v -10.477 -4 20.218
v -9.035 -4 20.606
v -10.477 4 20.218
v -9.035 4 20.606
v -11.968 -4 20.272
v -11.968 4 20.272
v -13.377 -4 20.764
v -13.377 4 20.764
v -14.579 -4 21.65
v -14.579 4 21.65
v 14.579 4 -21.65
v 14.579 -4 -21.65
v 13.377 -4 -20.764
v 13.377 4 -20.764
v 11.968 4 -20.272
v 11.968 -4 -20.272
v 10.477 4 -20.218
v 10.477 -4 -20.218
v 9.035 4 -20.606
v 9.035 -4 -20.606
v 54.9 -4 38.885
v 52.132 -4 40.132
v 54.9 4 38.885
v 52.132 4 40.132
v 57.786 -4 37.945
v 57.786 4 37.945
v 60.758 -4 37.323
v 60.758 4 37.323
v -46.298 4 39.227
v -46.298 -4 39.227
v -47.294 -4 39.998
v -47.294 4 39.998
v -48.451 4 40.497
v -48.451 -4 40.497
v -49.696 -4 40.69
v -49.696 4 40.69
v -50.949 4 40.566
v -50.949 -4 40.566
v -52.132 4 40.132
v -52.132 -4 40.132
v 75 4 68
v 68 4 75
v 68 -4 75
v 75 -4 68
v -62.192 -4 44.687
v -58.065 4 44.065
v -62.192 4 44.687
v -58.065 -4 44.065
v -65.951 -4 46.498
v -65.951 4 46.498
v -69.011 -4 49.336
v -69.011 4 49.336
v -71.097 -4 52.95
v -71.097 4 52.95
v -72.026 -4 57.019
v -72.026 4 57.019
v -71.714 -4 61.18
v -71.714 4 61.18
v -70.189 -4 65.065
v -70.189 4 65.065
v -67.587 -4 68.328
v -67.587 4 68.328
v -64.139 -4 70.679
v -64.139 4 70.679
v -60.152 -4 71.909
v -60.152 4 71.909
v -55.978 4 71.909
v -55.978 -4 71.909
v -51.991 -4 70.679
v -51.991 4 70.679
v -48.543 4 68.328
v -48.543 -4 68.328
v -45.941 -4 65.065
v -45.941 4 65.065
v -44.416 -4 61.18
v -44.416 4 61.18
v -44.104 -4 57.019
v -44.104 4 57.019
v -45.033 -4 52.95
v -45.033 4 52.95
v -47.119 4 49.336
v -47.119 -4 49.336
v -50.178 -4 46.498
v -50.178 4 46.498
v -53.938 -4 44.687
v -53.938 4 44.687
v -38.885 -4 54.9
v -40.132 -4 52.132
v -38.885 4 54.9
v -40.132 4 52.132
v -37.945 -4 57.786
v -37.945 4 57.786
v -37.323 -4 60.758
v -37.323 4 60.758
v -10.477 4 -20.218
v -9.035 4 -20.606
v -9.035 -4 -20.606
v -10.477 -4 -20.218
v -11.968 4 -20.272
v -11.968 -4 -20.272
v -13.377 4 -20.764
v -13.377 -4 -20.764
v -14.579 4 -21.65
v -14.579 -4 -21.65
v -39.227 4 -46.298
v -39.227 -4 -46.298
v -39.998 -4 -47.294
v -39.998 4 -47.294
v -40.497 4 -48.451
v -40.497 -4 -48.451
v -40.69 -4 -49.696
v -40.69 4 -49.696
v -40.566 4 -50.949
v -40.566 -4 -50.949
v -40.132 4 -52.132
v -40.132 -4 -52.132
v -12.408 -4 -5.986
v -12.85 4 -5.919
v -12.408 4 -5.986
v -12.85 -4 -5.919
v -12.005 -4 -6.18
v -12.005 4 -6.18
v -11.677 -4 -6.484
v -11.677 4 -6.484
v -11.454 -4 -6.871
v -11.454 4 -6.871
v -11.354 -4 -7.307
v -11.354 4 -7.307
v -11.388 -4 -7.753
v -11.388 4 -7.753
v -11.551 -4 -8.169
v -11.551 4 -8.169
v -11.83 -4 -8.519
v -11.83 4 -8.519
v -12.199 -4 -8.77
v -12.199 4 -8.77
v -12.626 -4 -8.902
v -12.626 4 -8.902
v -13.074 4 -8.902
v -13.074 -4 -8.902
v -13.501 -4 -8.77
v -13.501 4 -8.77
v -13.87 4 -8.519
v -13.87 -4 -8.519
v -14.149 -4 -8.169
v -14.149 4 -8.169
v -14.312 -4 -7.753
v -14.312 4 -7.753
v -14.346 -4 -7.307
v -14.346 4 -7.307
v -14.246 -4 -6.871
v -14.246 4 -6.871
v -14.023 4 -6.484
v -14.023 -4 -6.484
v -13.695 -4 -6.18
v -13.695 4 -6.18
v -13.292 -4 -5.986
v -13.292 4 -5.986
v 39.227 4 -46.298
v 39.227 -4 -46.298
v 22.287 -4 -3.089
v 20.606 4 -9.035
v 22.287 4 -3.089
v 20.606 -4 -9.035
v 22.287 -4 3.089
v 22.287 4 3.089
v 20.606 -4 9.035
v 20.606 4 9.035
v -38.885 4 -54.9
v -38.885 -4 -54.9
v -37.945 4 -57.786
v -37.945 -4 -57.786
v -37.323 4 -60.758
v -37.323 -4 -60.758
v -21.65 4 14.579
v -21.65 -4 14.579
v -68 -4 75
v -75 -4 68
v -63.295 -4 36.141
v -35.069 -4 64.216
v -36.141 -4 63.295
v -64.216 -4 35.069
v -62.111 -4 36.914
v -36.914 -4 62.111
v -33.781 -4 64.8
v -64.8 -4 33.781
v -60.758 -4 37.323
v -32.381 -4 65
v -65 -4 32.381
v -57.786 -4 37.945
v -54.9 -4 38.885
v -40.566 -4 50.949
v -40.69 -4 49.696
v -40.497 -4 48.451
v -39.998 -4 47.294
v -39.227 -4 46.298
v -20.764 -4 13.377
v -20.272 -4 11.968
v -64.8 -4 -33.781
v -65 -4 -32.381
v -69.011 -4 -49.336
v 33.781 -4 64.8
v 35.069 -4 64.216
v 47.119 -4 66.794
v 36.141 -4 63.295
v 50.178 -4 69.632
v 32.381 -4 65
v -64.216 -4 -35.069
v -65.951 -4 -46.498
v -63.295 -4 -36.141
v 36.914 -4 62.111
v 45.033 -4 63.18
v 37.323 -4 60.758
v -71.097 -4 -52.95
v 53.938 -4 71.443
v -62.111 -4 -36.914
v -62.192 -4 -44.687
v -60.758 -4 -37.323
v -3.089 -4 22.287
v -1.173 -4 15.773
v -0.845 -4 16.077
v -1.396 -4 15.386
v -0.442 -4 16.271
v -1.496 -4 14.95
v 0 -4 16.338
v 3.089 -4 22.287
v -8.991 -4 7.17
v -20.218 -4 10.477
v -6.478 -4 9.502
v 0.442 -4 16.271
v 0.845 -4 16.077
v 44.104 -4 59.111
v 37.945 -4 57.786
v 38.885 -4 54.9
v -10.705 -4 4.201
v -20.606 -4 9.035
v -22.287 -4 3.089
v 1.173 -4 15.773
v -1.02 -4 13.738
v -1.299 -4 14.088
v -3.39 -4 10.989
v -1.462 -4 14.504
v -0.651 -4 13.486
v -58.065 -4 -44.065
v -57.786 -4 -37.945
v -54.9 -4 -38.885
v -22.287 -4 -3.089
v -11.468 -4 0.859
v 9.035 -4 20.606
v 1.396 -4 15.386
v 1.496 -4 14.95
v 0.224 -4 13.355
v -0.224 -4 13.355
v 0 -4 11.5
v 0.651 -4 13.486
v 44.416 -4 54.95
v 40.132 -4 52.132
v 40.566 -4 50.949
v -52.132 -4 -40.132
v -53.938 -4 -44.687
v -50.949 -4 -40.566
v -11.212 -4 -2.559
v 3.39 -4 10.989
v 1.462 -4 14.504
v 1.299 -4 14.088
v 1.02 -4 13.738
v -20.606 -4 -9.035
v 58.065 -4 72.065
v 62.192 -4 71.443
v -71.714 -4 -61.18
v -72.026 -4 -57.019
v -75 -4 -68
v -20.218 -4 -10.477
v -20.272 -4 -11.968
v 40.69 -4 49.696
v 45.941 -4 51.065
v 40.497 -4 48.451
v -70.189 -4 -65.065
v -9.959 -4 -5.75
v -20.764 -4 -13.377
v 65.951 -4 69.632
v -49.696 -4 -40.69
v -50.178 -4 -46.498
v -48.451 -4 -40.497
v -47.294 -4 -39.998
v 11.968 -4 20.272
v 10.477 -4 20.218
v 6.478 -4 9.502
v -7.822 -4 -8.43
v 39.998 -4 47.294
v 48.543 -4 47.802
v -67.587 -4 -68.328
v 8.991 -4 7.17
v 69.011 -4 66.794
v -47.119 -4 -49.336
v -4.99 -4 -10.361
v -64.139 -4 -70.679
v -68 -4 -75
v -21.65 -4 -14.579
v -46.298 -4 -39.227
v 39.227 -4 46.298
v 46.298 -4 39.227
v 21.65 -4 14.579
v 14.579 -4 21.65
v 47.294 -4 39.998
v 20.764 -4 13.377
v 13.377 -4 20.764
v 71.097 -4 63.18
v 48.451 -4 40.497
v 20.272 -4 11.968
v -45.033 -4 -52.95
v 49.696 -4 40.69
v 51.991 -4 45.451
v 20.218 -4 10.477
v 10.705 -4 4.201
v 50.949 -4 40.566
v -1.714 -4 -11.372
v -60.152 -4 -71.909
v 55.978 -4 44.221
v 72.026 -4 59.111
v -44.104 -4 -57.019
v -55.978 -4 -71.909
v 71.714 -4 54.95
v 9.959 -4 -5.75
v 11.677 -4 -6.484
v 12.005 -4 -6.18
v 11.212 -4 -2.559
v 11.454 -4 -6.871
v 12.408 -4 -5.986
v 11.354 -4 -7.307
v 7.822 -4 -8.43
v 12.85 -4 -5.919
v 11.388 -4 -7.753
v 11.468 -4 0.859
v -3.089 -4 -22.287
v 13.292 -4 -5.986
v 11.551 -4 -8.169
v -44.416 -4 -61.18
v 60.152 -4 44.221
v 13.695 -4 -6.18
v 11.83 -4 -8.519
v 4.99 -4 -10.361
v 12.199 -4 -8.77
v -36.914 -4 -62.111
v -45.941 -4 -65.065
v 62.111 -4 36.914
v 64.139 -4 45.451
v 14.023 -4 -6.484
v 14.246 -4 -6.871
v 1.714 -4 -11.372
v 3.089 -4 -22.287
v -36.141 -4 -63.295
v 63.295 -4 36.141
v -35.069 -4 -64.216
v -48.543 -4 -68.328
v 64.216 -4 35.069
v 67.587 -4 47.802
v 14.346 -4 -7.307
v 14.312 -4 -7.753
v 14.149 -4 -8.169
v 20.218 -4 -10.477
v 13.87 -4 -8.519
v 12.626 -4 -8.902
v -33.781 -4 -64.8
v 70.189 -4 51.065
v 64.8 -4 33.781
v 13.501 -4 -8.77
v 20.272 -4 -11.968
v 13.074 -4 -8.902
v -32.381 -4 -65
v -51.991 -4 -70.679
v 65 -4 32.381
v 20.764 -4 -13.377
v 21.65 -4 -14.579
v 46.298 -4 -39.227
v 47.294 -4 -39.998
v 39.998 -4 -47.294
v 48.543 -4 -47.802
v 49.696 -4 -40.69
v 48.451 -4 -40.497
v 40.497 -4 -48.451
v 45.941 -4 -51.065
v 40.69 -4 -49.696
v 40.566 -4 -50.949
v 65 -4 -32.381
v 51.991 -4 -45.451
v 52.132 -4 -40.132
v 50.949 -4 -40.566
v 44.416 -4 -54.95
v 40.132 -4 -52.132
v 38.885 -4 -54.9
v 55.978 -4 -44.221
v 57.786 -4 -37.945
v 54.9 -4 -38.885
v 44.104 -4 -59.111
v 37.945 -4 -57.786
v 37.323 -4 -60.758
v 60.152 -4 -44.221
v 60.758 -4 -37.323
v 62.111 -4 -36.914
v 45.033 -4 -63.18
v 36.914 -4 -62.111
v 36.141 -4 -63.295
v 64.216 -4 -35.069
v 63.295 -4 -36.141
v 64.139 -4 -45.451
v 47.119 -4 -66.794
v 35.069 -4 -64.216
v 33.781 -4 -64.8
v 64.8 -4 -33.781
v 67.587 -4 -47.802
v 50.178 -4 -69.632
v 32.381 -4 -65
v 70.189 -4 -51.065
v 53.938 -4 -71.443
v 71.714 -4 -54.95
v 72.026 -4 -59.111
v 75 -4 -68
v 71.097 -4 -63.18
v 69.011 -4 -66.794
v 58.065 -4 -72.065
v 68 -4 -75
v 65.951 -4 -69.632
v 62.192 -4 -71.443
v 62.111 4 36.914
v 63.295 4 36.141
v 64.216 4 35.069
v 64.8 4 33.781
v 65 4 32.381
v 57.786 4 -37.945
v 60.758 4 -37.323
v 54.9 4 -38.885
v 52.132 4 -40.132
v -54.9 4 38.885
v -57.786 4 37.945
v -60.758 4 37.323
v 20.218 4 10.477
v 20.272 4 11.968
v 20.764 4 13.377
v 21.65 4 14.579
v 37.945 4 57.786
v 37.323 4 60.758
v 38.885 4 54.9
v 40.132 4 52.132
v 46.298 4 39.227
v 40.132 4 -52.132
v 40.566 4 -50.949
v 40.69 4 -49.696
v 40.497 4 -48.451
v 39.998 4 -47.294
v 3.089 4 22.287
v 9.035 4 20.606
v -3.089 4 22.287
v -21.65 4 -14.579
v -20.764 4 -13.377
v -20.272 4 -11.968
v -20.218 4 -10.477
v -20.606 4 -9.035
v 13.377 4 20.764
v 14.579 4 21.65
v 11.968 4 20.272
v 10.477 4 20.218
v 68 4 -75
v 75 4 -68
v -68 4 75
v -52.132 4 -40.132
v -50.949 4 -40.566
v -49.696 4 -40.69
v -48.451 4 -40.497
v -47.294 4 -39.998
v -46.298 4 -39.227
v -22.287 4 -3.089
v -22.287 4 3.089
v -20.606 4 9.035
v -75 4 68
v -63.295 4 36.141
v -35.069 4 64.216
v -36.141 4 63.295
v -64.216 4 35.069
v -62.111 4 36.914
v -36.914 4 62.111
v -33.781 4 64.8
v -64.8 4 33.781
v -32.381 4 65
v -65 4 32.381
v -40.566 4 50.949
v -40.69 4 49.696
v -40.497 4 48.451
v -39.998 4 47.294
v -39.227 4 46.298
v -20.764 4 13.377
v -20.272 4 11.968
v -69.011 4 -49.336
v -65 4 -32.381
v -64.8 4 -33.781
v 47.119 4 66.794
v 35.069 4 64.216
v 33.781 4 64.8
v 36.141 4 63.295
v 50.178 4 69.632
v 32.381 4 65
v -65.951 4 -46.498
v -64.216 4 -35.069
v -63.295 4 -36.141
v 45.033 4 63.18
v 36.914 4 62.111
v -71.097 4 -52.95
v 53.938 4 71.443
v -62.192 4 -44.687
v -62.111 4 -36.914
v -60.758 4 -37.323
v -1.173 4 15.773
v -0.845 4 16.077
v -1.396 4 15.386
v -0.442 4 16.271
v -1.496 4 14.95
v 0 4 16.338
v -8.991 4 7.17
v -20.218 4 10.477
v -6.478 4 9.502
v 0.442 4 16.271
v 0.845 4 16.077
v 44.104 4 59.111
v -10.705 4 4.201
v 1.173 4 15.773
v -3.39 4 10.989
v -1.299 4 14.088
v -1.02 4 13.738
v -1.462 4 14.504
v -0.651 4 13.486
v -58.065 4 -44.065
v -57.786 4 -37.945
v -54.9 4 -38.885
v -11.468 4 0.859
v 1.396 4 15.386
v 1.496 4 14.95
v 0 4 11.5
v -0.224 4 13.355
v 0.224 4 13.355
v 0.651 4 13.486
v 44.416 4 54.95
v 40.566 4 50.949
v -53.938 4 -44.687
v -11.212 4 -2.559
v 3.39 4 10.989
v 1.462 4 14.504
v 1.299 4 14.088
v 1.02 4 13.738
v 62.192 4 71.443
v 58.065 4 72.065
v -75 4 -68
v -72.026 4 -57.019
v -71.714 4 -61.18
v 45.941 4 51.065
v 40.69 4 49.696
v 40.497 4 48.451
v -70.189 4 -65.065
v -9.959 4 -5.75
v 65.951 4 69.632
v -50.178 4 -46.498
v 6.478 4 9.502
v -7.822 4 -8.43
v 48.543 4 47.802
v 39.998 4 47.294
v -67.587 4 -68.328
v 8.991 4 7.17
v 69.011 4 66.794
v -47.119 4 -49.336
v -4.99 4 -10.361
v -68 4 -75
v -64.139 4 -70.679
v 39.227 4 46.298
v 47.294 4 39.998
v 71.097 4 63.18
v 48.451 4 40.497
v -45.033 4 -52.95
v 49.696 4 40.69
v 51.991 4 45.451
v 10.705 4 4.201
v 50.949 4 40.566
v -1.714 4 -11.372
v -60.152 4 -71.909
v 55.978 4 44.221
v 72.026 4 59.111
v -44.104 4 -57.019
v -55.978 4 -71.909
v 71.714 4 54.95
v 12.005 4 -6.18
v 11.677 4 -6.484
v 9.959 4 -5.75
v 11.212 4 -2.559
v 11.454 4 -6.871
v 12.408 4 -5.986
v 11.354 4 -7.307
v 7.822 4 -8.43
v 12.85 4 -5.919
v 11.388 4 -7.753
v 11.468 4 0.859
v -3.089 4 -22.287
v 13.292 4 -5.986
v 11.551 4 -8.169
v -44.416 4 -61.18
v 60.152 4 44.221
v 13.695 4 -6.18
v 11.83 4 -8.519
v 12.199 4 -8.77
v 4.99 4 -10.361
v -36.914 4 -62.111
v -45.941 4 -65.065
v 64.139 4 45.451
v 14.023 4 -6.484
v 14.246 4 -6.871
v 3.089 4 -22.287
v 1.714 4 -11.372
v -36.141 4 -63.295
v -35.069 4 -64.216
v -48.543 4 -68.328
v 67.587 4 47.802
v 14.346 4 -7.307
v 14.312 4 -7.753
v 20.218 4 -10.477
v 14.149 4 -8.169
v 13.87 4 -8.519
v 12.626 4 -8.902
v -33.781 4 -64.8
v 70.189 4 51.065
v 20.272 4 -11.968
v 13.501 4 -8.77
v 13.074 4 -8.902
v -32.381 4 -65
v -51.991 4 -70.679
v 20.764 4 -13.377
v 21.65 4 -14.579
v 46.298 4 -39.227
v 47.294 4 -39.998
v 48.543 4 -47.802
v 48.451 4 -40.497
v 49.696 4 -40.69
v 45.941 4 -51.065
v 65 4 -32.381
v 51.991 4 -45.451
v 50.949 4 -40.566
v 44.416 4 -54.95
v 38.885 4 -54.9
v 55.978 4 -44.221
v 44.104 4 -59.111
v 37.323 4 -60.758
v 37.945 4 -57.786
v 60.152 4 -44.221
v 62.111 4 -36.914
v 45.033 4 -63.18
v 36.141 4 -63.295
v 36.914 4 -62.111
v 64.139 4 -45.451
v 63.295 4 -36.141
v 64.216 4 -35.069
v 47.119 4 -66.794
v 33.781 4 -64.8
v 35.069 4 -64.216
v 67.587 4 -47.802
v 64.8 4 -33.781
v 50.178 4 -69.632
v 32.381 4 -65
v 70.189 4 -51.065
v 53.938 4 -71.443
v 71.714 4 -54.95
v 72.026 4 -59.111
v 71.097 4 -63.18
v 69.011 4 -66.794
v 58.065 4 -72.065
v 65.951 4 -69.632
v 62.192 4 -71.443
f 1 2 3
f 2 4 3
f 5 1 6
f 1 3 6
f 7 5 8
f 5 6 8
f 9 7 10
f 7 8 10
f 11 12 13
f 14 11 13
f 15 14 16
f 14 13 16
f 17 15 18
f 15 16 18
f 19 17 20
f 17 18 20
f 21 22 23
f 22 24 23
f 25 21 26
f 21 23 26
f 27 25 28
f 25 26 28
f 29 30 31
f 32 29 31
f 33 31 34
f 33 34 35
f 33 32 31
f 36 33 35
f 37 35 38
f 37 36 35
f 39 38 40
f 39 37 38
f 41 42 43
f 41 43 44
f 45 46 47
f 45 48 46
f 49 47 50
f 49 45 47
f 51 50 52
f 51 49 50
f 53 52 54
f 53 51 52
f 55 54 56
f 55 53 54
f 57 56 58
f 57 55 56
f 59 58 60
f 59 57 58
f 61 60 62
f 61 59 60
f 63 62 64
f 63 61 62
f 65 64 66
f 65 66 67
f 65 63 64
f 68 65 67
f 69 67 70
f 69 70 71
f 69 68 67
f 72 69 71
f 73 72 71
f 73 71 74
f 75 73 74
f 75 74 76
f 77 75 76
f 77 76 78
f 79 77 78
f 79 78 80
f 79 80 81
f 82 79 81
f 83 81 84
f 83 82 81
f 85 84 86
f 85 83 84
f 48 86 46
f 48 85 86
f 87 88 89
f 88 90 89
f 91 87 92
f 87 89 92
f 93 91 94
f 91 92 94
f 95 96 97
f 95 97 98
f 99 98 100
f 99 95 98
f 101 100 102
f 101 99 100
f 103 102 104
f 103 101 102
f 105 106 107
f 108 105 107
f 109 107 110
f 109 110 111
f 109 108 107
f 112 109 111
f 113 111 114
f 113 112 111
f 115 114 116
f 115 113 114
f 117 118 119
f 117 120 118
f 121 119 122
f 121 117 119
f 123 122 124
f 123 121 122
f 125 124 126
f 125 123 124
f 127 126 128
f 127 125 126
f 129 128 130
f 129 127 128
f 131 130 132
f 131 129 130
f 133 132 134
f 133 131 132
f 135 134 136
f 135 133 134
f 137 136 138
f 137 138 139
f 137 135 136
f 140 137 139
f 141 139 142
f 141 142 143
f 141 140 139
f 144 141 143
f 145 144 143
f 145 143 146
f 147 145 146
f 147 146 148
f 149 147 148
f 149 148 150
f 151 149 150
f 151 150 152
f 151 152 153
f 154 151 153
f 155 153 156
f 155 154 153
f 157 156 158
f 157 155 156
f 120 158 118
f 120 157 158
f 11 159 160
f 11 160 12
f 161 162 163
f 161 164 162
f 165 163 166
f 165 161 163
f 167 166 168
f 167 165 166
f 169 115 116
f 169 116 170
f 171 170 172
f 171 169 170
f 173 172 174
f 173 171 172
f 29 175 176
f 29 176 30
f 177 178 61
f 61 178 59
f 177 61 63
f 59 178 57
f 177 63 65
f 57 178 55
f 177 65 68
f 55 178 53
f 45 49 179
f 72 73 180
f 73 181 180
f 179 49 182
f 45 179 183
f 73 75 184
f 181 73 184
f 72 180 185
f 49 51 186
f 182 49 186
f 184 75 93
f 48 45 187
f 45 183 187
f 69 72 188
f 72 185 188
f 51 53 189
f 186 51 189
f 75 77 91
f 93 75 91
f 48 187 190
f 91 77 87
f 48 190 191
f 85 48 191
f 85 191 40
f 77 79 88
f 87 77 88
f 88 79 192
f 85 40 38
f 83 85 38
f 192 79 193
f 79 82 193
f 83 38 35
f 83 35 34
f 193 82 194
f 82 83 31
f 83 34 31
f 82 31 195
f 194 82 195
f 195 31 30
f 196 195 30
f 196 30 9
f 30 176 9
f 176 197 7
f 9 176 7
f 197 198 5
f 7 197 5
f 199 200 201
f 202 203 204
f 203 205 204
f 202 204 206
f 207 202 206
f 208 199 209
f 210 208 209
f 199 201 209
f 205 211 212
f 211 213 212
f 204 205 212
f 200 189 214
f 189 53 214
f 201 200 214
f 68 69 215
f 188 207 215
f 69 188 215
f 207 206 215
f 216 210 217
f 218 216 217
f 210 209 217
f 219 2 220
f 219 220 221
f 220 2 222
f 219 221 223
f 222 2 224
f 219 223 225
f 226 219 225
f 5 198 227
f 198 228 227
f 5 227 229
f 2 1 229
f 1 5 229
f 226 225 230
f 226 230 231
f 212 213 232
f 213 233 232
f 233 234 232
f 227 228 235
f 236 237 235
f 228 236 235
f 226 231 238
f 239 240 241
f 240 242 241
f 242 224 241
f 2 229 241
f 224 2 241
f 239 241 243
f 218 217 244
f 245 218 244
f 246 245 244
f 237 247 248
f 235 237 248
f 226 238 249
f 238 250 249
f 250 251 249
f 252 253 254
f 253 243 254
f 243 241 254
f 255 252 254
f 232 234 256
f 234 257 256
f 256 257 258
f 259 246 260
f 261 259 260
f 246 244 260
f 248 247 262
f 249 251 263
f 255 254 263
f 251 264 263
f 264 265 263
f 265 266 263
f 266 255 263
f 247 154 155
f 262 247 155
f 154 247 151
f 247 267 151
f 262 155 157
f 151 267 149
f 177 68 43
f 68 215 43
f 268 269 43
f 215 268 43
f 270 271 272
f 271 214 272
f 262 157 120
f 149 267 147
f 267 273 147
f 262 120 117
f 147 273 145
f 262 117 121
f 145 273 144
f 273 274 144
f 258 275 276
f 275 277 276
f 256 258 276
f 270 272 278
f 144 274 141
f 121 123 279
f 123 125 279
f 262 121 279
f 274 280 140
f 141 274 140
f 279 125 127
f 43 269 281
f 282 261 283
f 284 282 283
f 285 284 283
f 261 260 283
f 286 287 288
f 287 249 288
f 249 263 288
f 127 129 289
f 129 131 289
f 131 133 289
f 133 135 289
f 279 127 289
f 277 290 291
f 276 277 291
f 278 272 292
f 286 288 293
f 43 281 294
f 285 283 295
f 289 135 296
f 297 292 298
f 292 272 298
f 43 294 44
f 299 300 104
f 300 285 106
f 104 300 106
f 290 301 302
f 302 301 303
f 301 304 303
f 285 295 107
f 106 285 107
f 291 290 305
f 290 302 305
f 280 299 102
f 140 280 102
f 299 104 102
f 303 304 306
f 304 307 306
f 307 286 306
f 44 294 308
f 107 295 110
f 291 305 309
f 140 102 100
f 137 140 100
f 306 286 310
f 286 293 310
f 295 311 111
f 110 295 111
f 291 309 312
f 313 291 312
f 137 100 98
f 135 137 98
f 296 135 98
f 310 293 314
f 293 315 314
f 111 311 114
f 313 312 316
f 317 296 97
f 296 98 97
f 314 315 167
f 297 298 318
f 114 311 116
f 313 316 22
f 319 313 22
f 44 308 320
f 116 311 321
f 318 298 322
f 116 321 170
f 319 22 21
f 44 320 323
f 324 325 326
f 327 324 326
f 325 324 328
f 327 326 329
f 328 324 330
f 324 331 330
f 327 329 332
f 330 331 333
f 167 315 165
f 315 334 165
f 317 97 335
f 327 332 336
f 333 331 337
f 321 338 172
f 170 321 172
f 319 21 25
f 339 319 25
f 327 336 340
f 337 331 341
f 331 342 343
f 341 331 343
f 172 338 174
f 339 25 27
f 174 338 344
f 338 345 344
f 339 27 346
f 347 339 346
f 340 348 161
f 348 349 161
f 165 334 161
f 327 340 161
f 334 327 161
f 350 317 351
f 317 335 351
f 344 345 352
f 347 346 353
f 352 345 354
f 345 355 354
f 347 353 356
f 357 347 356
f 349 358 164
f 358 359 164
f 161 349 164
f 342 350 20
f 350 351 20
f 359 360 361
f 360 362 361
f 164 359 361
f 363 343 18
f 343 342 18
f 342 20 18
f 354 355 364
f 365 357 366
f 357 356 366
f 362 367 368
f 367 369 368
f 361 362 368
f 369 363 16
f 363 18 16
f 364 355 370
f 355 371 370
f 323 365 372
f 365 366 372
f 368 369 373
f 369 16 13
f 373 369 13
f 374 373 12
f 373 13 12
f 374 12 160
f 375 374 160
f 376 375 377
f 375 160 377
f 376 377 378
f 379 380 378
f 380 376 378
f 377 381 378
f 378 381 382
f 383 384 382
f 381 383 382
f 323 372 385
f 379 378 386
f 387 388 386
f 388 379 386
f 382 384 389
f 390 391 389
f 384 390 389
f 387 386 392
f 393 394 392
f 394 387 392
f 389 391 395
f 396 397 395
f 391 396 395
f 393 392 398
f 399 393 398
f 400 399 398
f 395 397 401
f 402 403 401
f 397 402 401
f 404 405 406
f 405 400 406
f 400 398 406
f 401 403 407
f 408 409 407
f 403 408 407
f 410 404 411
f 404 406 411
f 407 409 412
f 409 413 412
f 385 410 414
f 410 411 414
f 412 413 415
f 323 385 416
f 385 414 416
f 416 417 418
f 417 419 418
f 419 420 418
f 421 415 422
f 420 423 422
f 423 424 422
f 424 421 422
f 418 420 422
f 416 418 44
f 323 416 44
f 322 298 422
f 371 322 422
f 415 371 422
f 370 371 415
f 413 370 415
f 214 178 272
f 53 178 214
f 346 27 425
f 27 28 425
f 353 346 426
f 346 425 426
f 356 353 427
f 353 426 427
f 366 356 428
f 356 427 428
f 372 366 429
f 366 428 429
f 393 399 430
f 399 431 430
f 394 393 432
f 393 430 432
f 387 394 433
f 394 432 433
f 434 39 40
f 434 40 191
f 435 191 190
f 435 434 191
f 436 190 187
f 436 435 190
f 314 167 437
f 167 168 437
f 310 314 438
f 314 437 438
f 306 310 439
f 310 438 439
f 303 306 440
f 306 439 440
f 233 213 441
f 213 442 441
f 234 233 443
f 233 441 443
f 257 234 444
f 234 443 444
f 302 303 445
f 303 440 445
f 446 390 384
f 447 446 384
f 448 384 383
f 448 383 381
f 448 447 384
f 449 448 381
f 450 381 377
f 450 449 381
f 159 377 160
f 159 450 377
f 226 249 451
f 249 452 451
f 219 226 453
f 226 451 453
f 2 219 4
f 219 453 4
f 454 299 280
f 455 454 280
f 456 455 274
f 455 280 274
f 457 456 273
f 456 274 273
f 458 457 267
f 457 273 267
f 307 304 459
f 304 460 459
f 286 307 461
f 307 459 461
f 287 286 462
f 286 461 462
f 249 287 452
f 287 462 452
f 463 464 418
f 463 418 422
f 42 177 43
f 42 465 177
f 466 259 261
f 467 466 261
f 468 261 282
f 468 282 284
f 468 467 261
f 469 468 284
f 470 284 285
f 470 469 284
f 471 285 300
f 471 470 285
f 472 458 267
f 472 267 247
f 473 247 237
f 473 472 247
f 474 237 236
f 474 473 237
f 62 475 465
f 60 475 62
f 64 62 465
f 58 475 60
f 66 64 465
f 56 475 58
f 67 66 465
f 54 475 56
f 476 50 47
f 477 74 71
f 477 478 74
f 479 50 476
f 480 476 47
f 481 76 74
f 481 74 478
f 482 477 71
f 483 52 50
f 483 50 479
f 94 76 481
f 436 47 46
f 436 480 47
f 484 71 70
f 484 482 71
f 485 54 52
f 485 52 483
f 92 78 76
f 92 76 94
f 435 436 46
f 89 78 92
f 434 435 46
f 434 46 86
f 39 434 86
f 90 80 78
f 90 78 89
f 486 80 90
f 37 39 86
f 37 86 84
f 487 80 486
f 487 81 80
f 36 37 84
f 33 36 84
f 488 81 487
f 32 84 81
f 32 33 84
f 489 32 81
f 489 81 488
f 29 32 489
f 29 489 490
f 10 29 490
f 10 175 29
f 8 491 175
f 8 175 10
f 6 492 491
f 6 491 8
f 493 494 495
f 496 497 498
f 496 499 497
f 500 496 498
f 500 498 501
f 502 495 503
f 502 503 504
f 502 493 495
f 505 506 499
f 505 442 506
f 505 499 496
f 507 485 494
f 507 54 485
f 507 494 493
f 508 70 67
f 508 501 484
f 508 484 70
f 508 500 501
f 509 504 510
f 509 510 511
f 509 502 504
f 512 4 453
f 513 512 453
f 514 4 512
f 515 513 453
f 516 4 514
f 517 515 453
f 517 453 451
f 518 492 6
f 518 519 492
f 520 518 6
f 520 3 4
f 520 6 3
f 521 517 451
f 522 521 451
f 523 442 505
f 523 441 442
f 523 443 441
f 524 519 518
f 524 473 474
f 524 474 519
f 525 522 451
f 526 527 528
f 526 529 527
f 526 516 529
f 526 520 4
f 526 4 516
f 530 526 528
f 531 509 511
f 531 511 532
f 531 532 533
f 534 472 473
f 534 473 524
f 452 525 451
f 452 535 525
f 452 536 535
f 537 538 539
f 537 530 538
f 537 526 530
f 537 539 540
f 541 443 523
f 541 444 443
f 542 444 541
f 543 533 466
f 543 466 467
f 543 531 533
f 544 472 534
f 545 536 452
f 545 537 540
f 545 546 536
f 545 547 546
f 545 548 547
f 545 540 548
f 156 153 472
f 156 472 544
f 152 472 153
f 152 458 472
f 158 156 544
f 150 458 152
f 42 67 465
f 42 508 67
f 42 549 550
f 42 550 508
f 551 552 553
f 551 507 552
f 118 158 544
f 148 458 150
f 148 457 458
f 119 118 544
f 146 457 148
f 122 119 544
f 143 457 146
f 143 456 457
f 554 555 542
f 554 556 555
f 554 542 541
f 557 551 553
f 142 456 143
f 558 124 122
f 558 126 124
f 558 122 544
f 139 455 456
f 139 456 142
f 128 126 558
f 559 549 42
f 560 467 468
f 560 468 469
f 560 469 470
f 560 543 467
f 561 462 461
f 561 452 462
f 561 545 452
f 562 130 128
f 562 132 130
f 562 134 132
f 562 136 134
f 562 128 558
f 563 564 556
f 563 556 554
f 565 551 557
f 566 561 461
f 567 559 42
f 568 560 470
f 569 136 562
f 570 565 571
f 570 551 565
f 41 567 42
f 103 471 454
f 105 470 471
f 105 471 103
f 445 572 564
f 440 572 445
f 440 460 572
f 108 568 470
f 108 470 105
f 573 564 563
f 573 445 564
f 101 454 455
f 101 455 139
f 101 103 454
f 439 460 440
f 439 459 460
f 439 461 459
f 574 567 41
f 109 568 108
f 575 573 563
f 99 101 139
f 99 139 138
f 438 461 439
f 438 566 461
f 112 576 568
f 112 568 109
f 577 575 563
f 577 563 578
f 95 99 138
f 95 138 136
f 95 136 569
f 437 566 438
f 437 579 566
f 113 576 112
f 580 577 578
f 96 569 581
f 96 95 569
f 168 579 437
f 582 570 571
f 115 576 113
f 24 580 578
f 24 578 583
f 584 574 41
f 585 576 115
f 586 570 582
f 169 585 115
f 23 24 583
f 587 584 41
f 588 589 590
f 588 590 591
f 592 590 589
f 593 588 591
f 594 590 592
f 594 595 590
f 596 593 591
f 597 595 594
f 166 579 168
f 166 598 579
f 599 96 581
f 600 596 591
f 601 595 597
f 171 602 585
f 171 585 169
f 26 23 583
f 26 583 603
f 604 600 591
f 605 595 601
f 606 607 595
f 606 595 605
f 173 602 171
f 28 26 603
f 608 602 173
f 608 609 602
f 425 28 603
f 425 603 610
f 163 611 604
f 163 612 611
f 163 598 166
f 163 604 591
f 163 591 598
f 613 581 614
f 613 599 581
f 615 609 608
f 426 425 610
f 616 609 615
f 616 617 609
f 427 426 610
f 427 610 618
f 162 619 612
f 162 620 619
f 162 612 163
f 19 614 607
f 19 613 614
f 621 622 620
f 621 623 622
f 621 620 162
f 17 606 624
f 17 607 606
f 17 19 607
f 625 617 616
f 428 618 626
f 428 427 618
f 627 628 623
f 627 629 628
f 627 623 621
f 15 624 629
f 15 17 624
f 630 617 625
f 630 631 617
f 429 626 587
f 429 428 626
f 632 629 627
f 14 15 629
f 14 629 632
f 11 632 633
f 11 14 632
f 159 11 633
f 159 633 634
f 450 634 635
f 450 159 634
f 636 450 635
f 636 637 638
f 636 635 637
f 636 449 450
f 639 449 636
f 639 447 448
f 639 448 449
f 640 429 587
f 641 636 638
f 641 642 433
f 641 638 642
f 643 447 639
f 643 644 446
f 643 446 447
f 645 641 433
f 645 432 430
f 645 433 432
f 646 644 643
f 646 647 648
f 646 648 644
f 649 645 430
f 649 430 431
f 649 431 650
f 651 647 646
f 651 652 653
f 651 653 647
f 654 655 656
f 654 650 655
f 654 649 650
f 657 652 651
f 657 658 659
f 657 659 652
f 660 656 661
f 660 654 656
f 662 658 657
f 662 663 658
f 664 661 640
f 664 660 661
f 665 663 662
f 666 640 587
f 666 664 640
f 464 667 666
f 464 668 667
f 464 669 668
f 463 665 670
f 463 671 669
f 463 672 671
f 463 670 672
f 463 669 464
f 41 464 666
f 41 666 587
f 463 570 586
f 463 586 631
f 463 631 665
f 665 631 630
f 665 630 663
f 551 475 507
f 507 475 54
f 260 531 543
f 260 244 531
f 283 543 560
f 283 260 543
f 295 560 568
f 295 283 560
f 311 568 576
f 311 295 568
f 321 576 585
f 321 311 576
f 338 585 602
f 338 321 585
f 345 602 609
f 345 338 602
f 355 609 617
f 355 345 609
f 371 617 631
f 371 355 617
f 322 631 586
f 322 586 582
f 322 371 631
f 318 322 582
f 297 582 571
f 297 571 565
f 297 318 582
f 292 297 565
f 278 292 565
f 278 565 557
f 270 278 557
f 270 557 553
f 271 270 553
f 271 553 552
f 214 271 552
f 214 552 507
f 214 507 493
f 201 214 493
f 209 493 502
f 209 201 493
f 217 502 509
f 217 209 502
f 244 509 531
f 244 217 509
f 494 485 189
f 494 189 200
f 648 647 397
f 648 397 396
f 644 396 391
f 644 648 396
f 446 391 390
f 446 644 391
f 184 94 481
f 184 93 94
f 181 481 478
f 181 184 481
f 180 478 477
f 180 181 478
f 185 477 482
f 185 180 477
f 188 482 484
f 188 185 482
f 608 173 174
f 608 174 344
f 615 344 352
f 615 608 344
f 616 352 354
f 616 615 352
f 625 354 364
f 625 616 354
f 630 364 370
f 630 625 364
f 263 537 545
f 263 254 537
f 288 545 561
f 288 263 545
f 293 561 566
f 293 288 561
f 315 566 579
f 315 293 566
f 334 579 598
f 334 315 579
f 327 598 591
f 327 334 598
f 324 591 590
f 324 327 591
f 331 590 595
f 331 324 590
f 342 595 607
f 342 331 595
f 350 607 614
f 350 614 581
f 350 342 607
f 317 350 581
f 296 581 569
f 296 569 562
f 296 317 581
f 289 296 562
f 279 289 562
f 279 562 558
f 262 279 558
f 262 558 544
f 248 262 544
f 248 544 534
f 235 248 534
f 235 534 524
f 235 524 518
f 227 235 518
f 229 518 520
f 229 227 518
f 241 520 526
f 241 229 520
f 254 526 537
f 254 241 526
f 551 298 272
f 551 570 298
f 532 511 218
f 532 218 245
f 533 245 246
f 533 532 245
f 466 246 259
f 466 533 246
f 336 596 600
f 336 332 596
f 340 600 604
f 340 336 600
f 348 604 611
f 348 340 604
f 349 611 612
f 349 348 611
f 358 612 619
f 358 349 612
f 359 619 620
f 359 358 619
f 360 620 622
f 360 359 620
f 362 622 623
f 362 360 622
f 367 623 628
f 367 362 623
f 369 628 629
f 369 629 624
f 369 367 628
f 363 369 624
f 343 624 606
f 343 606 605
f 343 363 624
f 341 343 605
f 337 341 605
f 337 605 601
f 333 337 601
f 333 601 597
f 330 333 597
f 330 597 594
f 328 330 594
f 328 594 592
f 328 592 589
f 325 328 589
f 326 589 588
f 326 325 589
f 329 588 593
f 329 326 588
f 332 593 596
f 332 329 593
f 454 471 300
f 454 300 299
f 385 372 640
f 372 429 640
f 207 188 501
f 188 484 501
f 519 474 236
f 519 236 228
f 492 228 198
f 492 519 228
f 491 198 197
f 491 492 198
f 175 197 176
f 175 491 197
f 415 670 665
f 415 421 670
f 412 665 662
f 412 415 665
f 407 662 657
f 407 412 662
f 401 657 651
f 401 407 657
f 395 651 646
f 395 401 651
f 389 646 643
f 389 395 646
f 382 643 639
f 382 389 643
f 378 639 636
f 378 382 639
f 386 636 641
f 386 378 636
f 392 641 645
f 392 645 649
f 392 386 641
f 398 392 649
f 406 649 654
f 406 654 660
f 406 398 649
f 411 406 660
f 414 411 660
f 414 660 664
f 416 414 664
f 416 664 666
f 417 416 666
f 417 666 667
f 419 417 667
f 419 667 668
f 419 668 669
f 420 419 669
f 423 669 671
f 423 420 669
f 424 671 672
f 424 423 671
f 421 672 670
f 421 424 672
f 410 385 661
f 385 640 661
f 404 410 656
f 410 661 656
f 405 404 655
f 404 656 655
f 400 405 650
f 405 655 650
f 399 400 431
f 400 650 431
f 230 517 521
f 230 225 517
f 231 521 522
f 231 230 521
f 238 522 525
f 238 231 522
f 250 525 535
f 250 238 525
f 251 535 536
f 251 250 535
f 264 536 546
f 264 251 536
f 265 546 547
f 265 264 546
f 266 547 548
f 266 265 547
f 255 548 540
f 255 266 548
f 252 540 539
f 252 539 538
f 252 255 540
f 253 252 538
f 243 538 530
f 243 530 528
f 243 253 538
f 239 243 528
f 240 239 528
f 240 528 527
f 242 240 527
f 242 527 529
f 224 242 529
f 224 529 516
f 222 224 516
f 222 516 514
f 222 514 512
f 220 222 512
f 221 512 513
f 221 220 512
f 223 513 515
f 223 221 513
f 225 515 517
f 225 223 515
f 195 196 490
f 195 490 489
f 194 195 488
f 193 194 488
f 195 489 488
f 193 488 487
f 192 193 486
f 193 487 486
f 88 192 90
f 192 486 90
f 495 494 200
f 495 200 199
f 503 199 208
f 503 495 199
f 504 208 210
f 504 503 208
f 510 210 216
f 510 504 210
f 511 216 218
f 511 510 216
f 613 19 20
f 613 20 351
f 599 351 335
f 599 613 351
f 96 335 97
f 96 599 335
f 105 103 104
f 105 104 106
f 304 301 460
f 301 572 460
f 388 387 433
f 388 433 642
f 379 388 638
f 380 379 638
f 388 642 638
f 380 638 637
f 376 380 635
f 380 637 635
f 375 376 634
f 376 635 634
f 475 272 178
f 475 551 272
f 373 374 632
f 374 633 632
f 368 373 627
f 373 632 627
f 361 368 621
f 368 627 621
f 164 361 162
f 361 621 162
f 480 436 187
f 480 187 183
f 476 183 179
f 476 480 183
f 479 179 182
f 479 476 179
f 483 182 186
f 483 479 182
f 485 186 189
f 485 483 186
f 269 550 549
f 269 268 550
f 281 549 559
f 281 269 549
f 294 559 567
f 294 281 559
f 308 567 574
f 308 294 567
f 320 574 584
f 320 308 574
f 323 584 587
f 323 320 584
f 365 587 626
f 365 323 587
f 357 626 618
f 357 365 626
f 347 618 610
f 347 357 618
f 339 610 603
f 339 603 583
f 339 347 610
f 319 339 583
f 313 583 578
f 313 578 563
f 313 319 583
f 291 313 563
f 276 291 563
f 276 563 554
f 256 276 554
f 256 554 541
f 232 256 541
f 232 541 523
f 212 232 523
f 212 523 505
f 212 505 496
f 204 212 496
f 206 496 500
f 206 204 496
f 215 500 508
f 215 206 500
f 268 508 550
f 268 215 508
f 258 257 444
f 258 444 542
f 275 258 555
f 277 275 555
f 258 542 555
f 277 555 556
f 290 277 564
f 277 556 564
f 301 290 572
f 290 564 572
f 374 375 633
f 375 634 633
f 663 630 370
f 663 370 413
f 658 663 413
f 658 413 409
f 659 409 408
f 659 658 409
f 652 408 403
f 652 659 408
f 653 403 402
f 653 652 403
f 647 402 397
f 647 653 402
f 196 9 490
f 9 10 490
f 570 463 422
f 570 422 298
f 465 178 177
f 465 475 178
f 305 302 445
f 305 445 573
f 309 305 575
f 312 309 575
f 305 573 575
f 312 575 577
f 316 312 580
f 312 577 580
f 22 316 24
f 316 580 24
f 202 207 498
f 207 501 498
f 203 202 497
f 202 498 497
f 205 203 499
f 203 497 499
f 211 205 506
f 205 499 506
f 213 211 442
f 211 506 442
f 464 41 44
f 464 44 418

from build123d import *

# Parameters (mm, degrees)
SKETCH1_R           = 11.5
SKETCH1_R_2         = 14
SKETCH1_R_3         = 1.5
BOSS_EXTRUDE1_DEPTH = 4


with BuildPart() as part:
    # Sketch1 → Boss-Extrude1 (new, symmetric)
    with BuildSketch(Plane(origin=(0, 0, 0), x_dir=(1, 0, 0), z_dir=(0, 1, 0))):
        Polygon((-68, -75), (68, -75), (75, -68), (75, 68), (68, 75), (-68, 75), (-75, 68), (-75, -68), align=None)
        with Locations(Location((0, 0, 0), (0, 0, 270))):
            Circle(SKETCH1_R, mode=Mode.SUBTRACT)
        with Locations(Location((-58.064971157, 58.064971157, 0), (0, 0, 270))):
            Circle(SKETCH1_R_2, mode=Mode.SUBTRACT)
        with Locations(Location((58.064971157, 58.064971157, 0), (0, 0, 90))):
            Circle(SKETCH1_R_2, mode=Mode.SUBTRACT)
        with Locations(Location((58.064971157, -58.064971157, 0), (0, 0, 270))):
            Circle(SKETCH1_R_2, mode=Mode.SUBTRACT)
        with Locations(Location((-58.064971157, -58.064971157, 0), (0, 0, 90))):
            Circle(SKETCH1_R_2, mode=Mode.SUBTRACT)
        with Locations(Location((-12.85, 7.418950959, 0), (0, 0, 270))):
            Circle(SKETCH1_R_3, mode=Mode.SUBTRACT)
        with Locations(Location((12.85, 7.418950959, 0), (0, 0, 270))):
            Circle(SKETCH1_R_3, mode=Mode.SUBTRACT)
        with Locations(Location((0, -14.837901918, 0), (0, 0, 270))):
            Circle(SKETCH1_R_3, mode=Mode.SUBTRACT)
        with BuildLine():
            Line((-65, -32.380987139), (-65, 32.380987139))
            ThreePointArc((-65, 32.380987139), (-63.793934553, 35.637681876), (-60.757575758, 37.323261815))
            ThreePointArc((-60.757575758, 37.323261815), (-56.330087552, 38.376089353), (-52.1316343, 40.132246498))
            ThreePointArc((-52.1316343, 40.132246498), (-49.06707081, 40.632452823), (-46.298177948, 39.227110136))
            Line((-46.298177948, 39.227110136), (-21.649754839, 14.578687027))
            ThreePointArc((-21.649754839, 14.578687027), (-20.271607616, 11.968214073), (-20.606145336, 9.035307099))
            ThreePointArc((-20.606145336, 9.035307099), (-22.5, 0), (-20.606145336, -9.035307099))
            ThreePointArc((-20.606145336, -9.035307099), (-20.271607616, -11.968214073), (-21.649754839, -14.578687027))
            Line((-21.649754839, -14.578687027), (-46.298177948, -39.227110136))
            ThreePointArc((-46.298177948, -39.227110136), (-49.06707081, -40.632452823), (-52.1316343, -40.132246498))
            ThreePointArc((-52.1316343, -40.132246498), (-56.330087552, -38.376089353), (-60.757575758, -37.323261815))
            ThreePointArc((-60.757575758, -37.323261815), (-63.793934553, -35.637681876), (-65, -32.380987139))
        make_face(mode=Mode.SUBTRACT)
        with BuildLine():
            Line((-32.380987139, 65), (32.380987139, 65))
            ThreePointArc((32.380987139, 65), (35.637681876, 63.793934553), (37.323261815, 60.757575758))
            ThreePointArc((37.323261815, 60.757575758), (38.376089353, 56.330087552), (40.132246498, 52.1316343))
            ThreePointArc((40.132246498, 52.1316343), (40.632452823, 49.06707081), (39.227110136, 46.298177948))
            Line((39.227110136, 46.298177948), (14.578687027, 21.649754839))
            ThreePointArc((14.578687027, 21.649754839), (11.968214073, 20.271607616), (9.035307099, 20.606145336))
            ThreePointArc((9.035307099, 20.606145336), (0, 22.5), (-9.035307099, 20.606145336))
            ThreePointArc((-9.035307099, 20.606145336), (-11.968214073, 20.271607616), (-14.578687027, 21.649754839))
            Line((-14.578687027, 21.649754839), (-39.227110136, 46.298177948))
            ThreePointArc((-39.227110136, 46.298177948), (-40.632452823, 49.06707081), (-40.132246498, 52.1316343))
            ThreePointArc((-40.132246498, 52.1316343), (-38.376089353, 56.330087552), (-37.323261815, 60.757575758))
            ThreePointArc((-37.323261815, 60.757575758), (-35.637681876, 63.793934553), (-32.380987139, 65))
        make_face(mode=Mode.SUBTRACT)
        with BuildLine():
            Line((65, -32.380987139), (65, 32.380987139))
            ThreePointArc((65, 32.380987139), (63.793934553, 35.637681876), (60.757575758, 37.323261815))
            ThreePointArc((60.757575758, 37.323261815), (56.330087552, 38.376089353), (52.1316343, 40.132246498))
            ThreePointArc((52.1316343, 40.132246498), (49.06707081, 40.632452823), (46.298177948, 39.227110136))
            Line((46.298177948, 39.227110136), (21.649754839, 14.578687027))
            ThreePointArc((21.649754839, 14.578687027), (20.271607616, 11.968214073), (20.606145336, 9.035307099))
            ThreePointArc((20.606145336, 9.035307099), (22.5, 0), (20.606145336, -9.035307099))
            ThreePointArc((20.606145336, -9.035307099), (20.271607616, -11.968214073), (21.649754839, -14.578687027))
            Line((21.649754839, -14.578687027), (46.298177948, -39.227110136))
            ThreePointArc((46.298177948, -39.227110136), (49.06707081, -40.632452823), (52.1316343, -40.132246498))
            ThreePointArc((52.1316343, -40.132246498), (56.330087552, -38.376089353), (60.757575758, -37.323261815))
            ThreePointArc((60.757575758, -37.323261815), (63.793934553, -35.637681876), (65, -32.380987139))
        make_face(mode=Mode.SUBTRACT)
        with BuildLine():
            Line((-32.380987139, -65), (32.380987139, -65))
            ThreePointArc((32.380987139, -65), (35.637681876, -63.793934553), (37.323261815, -60.757575758))
            ThreePointArc((37.323261815, -60.757575758), (38.376089353, -56.330087552), (40.132246498, -52.1316343))
            ThreePointArc((40.132246498, -52.1316343), (40.632452823, -49.06707081), (39.227110136, -46.298177948))
            Line((39.227110136, -46.298177948), (14.578687027, -21.649754839))
            ThreePointArc((14.578687027, -21.649754839), (11.968214073, -20.271607616), (9.035307099, -20.606145336))
            ThreePointArc((9.035307099, -20.606145336), (0, -22.5), (-9.035307099, -20.606145336))
            ThreePointArc((-9.035307099, -20.606145336), (-11.968214073, -20.271607616), (-14.578687027, -21.649754839))
            Line((-14.578687027, -21.649754839), (-39.227110136, -46.298177948))
            ThreePointArc((-39.227110136, -46.298177948), (-40.632452823, -49.06707081), (-40.132246498, -52.1316343))
            ThreePointArc((-40.132246498, -52.1316343), (-38.376089353, -56.330087552), (-37.323261815, -60.757575758))
            ThreePointArc((-37.323261815, -60.757575758), (-35.637681876, -63.793934553), (-32.380987139, -65))
        make_face(mode=Mode.SUBTRACT)
    extrude(amount=BOSS_EXTRUDE1_DEPTH, both=True)


solid = part.part
